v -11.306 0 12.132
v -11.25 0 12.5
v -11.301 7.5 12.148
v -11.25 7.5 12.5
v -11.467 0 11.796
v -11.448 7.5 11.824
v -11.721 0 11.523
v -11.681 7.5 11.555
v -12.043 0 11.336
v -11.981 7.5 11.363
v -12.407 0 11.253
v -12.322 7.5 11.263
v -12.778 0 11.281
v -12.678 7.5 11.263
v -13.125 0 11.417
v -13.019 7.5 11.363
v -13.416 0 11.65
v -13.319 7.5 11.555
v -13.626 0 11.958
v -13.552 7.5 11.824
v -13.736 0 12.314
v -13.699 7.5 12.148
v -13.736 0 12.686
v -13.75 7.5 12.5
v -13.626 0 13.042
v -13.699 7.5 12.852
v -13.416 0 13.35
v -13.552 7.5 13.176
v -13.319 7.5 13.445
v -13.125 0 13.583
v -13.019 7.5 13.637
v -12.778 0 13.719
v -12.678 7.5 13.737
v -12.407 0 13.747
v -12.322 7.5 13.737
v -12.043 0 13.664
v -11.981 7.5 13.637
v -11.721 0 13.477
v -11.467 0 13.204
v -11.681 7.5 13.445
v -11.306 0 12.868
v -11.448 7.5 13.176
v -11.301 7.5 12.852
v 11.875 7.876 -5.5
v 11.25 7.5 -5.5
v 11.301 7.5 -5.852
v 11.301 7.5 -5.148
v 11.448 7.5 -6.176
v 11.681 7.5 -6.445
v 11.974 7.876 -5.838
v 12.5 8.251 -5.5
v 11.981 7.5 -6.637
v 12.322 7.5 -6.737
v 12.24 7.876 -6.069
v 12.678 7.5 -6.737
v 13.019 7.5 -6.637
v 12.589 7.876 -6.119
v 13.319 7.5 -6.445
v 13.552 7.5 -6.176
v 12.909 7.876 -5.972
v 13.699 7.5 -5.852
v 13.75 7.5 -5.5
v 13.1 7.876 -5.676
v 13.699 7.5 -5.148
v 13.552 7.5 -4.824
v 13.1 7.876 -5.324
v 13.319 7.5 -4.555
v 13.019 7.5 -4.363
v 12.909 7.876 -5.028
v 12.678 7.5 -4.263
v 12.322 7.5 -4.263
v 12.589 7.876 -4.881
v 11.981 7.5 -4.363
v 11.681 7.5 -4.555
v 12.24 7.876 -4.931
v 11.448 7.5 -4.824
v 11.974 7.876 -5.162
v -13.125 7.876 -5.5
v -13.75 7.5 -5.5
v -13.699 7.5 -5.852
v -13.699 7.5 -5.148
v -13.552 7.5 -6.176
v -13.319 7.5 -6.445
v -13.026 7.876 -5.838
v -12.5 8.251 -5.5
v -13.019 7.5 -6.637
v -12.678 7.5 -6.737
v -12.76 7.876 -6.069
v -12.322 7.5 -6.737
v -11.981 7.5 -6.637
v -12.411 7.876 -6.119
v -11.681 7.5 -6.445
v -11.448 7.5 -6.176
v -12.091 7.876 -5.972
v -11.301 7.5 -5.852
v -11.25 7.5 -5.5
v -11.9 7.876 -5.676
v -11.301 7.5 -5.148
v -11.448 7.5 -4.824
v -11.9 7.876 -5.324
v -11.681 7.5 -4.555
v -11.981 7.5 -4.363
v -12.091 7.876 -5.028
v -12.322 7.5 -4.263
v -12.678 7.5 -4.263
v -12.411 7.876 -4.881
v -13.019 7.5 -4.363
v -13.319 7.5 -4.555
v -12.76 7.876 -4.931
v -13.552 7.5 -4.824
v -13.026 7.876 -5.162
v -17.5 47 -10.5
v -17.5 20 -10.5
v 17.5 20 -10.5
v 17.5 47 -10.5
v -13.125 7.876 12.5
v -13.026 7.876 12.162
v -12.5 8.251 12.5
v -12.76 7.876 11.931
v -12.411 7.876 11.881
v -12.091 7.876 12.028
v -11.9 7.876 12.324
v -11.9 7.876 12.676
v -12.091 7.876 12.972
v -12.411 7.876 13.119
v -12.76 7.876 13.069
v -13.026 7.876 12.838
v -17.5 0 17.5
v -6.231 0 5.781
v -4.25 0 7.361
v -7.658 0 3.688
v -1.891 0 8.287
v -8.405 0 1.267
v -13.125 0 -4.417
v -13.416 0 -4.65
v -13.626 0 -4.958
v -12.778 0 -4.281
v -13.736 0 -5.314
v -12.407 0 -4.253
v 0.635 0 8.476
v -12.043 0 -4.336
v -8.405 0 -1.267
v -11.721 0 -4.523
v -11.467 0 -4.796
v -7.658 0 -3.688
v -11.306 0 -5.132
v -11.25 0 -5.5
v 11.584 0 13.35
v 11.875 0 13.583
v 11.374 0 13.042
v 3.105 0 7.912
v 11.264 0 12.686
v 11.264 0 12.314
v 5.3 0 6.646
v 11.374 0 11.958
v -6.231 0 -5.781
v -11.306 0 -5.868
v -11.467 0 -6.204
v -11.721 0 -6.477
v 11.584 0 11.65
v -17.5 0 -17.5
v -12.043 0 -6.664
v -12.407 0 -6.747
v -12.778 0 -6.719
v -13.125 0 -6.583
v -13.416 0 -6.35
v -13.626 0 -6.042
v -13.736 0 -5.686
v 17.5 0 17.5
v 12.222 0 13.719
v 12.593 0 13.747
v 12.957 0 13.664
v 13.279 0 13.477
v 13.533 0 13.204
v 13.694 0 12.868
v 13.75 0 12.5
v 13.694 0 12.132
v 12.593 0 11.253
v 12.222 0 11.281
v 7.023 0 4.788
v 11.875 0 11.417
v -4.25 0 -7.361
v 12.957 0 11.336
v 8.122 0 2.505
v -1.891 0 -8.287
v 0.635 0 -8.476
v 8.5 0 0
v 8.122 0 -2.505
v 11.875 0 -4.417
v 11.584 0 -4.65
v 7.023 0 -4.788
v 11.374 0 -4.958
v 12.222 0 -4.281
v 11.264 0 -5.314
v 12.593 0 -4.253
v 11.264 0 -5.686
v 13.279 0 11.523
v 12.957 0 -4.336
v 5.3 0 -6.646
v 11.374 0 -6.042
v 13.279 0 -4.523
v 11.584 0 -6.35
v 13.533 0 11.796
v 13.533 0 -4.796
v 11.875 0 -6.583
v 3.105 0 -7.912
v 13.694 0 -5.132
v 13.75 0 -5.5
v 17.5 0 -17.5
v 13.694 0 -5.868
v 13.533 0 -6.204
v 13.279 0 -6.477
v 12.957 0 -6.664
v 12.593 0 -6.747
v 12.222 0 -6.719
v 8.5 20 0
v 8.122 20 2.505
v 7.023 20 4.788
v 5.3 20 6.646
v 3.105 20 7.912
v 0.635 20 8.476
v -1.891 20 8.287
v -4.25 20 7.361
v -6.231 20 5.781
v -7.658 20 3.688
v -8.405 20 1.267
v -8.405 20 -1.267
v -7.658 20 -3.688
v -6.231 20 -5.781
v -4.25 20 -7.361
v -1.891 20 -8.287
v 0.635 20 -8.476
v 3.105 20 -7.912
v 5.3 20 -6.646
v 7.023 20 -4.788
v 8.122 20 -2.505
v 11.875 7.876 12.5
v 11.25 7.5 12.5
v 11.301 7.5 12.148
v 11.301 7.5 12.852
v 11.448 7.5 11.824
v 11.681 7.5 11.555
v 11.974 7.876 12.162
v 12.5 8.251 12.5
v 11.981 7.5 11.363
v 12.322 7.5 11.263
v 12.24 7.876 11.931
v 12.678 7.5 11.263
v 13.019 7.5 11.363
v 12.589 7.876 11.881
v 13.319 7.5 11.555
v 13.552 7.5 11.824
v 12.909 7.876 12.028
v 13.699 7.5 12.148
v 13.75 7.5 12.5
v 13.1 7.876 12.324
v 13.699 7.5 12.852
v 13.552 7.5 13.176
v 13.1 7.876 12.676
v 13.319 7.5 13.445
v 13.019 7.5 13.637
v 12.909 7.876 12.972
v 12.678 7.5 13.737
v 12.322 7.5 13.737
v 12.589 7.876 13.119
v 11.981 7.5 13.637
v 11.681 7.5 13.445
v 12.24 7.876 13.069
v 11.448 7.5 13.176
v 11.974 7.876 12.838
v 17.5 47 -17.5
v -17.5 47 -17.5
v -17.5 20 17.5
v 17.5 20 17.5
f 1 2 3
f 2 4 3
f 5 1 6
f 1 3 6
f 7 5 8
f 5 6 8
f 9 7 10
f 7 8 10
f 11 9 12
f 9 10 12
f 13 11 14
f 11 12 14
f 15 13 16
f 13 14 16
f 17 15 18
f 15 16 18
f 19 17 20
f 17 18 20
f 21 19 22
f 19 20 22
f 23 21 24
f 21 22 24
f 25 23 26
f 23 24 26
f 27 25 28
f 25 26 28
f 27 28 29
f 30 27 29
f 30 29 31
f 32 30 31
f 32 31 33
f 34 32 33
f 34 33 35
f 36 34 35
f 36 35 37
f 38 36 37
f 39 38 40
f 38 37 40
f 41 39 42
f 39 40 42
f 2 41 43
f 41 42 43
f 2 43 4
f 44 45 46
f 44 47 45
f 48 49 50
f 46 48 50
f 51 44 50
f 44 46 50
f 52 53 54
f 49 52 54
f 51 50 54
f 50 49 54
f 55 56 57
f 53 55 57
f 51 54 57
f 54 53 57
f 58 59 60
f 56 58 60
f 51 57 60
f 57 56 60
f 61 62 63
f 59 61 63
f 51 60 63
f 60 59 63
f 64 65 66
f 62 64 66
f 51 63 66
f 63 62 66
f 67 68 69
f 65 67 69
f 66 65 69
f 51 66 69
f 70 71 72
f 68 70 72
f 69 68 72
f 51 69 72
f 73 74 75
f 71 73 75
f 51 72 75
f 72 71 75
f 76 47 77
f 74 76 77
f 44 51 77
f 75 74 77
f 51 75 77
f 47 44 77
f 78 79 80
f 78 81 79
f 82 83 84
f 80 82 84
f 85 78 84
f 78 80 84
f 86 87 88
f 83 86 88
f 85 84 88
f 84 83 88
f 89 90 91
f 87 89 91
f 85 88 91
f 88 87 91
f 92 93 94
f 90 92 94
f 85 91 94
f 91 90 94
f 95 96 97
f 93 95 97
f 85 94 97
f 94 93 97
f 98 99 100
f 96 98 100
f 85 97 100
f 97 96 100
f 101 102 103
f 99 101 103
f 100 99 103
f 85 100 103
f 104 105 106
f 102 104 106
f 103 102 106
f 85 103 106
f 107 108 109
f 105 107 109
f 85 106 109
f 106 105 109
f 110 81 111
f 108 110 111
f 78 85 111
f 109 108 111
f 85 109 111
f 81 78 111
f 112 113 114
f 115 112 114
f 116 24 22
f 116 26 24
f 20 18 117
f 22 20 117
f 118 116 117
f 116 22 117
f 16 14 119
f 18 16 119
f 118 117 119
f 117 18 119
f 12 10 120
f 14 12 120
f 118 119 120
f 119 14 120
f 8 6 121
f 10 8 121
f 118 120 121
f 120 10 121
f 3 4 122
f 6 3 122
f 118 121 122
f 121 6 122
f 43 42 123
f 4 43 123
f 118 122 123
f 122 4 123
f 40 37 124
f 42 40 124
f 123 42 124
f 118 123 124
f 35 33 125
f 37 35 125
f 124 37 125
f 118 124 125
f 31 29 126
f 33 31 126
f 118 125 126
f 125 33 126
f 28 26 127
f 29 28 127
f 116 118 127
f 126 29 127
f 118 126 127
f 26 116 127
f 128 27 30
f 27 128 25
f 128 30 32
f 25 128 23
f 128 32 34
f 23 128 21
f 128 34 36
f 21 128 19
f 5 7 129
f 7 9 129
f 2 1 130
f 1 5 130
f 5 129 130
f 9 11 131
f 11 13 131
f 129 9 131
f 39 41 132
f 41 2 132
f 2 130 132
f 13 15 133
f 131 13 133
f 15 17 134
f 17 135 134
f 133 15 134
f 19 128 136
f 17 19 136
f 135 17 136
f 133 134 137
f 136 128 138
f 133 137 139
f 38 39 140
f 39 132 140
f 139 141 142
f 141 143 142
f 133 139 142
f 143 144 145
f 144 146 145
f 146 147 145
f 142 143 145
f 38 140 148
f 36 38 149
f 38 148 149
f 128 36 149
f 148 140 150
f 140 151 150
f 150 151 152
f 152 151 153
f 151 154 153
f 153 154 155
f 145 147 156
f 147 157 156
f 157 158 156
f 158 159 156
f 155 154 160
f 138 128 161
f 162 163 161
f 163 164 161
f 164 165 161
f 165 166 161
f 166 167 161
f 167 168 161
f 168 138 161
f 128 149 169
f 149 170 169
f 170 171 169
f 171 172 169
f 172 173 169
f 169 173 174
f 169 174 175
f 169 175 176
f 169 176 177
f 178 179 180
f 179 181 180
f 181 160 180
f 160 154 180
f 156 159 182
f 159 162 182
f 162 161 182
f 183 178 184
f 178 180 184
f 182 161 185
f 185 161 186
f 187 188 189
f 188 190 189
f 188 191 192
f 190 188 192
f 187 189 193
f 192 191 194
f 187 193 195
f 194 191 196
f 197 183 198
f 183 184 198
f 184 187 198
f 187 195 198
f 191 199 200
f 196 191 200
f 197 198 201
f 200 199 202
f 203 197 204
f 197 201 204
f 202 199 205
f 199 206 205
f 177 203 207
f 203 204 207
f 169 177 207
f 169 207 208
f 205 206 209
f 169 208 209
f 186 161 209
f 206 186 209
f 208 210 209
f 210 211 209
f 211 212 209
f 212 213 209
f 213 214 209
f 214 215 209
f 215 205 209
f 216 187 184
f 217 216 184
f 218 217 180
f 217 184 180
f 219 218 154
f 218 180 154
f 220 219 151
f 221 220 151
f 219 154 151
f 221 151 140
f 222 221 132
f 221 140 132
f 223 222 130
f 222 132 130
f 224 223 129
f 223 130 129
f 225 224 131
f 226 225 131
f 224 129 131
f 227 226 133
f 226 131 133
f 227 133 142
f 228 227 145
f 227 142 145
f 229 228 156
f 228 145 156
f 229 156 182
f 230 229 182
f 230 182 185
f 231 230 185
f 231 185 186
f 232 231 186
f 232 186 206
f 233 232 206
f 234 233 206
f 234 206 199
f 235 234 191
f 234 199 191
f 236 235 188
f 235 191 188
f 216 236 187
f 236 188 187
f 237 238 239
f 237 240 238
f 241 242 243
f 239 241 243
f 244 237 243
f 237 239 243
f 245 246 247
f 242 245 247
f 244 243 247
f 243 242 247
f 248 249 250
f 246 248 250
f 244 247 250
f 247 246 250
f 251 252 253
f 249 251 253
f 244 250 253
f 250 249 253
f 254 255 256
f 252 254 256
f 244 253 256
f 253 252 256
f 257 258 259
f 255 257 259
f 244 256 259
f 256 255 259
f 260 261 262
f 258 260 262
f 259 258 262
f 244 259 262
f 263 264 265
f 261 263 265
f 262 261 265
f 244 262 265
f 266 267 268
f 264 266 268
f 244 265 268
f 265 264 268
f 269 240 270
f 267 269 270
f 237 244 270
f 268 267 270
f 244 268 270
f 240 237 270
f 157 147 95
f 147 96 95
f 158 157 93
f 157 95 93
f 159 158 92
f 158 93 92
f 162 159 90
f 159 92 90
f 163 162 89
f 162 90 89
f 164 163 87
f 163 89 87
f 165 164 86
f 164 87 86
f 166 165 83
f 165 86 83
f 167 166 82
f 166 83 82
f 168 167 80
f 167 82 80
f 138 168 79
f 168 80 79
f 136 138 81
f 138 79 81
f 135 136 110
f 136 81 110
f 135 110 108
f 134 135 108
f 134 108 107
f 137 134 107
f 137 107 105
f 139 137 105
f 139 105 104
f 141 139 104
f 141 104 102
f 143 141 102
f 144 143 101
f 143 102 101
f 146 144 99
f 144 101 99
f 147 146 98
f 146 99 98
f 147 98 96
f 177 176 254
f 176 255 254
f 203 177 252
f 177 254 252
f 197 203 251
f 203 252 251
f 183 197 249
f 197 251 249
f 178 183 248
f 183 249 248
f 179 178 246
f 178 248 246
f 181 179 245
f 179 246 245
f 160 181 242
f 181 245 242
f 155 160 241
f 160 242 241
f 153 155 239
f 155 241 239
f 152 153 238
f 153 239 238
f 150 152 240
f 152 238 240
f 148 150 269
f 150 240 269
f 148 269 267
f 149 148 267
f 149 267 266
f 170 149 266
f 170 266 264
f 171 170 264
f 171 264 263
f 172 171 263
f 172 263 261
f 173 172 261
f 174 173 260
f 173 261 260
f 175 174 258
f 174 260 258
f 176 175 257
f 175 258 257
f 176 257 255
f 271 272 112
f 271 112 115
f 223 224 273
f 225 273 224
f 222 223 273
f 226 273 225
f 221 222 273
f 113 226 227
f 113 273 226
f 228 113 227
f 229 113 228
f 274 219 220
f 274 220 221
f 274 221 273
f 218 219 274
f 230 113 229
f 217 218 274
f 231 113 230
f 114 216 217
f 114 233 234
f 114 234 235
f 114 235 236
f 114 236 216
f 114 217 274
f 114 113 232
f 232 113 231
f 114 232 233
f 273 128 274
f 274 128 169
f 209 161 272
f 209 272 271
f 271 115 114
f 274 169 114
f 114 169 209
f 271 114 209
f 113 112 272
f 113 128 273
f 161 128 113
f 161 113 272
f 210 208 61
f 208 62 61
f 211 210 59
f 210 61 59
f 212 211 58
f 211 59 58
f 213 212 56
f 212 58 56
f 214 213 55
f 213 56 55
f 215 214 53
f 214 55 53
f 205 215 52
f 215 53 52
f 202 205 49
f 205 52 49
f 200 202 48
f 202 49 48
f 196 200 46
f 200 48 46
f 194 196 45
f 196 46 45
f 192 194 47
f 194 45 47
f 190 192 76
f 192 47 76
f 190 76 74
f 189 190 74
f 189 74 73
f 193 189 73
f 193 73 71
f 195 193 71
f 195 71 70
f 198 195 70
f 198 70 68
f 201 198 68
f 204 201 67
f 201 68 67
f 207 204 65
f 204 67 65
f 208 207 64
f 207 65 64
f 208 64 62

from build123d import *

# Parameters (mm, degrees)
SKETCH1_W             = 35
SKETCH1_H             = 35
BOSS_EXTRUDE1_DEPTH   = 20
SKETCH2_W             = 35
SKETCH2_H             = 7
BOSS_EXTRUDE2_DEPTH   = 27
SKETCH3_R             = 8.5
CUT_EXTRUDE1_DEPTH    = 20
M3_TAPPED_HOLE1_D     = 2.5
M3_TAPPED_HOLE1_DEPTH = 7.5
M3_TAPPED_HOLE1_TIP   = 0.751075774


with BuildPart() as part:
    # Sketch1 → Boss-Extrude1 (new body)
    with BuildSketch(Plane(origin=(0, 0, 0), x_dir=(1, 0, 0), z_dir=(0, 1, 0))):
        Rectangle(SKETCH1_W, SKETCH1_H)
    extrude(amount=BOSS_EXTRUDE1_DEPTH)

    # Sketch2 → Boss-Extrude2 (add)
    with BuildSketch(Plane(origin=(0, 20, 0), x_dir=(1, 0, 0), z_dir=(0, 1, 0))):
        with Locations((0, 14)):
            Rectangle(SKETCH2_W, SKETCH2_H)
    extrude(amount=BOSS_EXTRUDE2_DEPTH)

    # Sketch3 → Cut-Extrude1 (cut)
    with BuildSketch(Plane.XZ):
        Circle(SKETCH3_R)
    extrude(amount=-CUT_EXTRUDE1_DEPTH, mode=Mode.SUBTRACT)

    # M3 Tapped Hole1
    with Locations(Plane(origin=(0, 0, 0), x_dir=(-1, 0, 0), z_dir=(0, -1, 0))):
        with Locations((-12.5, 5.5), (12.5, 5.5), (12.5, -12.5), (-12.5, -12.5)):
            Hole(M3_TAPPED_HOLE1_D / 2, depth=M3_TAPPED_HOLE1_DEPTH)
            with Locations((0, 0, -(M3_TAPPED_HOLE1_DEPTH + M3_TAPPED_HOLE1_TIP / 2))):  # 118° drill point
                Cone(0, M3_TAPPED_HOLE1_D / 2, M3_TAPPED_HOLE1_TIP, mode=Mode.SUBTRACT)


solid = part.part
